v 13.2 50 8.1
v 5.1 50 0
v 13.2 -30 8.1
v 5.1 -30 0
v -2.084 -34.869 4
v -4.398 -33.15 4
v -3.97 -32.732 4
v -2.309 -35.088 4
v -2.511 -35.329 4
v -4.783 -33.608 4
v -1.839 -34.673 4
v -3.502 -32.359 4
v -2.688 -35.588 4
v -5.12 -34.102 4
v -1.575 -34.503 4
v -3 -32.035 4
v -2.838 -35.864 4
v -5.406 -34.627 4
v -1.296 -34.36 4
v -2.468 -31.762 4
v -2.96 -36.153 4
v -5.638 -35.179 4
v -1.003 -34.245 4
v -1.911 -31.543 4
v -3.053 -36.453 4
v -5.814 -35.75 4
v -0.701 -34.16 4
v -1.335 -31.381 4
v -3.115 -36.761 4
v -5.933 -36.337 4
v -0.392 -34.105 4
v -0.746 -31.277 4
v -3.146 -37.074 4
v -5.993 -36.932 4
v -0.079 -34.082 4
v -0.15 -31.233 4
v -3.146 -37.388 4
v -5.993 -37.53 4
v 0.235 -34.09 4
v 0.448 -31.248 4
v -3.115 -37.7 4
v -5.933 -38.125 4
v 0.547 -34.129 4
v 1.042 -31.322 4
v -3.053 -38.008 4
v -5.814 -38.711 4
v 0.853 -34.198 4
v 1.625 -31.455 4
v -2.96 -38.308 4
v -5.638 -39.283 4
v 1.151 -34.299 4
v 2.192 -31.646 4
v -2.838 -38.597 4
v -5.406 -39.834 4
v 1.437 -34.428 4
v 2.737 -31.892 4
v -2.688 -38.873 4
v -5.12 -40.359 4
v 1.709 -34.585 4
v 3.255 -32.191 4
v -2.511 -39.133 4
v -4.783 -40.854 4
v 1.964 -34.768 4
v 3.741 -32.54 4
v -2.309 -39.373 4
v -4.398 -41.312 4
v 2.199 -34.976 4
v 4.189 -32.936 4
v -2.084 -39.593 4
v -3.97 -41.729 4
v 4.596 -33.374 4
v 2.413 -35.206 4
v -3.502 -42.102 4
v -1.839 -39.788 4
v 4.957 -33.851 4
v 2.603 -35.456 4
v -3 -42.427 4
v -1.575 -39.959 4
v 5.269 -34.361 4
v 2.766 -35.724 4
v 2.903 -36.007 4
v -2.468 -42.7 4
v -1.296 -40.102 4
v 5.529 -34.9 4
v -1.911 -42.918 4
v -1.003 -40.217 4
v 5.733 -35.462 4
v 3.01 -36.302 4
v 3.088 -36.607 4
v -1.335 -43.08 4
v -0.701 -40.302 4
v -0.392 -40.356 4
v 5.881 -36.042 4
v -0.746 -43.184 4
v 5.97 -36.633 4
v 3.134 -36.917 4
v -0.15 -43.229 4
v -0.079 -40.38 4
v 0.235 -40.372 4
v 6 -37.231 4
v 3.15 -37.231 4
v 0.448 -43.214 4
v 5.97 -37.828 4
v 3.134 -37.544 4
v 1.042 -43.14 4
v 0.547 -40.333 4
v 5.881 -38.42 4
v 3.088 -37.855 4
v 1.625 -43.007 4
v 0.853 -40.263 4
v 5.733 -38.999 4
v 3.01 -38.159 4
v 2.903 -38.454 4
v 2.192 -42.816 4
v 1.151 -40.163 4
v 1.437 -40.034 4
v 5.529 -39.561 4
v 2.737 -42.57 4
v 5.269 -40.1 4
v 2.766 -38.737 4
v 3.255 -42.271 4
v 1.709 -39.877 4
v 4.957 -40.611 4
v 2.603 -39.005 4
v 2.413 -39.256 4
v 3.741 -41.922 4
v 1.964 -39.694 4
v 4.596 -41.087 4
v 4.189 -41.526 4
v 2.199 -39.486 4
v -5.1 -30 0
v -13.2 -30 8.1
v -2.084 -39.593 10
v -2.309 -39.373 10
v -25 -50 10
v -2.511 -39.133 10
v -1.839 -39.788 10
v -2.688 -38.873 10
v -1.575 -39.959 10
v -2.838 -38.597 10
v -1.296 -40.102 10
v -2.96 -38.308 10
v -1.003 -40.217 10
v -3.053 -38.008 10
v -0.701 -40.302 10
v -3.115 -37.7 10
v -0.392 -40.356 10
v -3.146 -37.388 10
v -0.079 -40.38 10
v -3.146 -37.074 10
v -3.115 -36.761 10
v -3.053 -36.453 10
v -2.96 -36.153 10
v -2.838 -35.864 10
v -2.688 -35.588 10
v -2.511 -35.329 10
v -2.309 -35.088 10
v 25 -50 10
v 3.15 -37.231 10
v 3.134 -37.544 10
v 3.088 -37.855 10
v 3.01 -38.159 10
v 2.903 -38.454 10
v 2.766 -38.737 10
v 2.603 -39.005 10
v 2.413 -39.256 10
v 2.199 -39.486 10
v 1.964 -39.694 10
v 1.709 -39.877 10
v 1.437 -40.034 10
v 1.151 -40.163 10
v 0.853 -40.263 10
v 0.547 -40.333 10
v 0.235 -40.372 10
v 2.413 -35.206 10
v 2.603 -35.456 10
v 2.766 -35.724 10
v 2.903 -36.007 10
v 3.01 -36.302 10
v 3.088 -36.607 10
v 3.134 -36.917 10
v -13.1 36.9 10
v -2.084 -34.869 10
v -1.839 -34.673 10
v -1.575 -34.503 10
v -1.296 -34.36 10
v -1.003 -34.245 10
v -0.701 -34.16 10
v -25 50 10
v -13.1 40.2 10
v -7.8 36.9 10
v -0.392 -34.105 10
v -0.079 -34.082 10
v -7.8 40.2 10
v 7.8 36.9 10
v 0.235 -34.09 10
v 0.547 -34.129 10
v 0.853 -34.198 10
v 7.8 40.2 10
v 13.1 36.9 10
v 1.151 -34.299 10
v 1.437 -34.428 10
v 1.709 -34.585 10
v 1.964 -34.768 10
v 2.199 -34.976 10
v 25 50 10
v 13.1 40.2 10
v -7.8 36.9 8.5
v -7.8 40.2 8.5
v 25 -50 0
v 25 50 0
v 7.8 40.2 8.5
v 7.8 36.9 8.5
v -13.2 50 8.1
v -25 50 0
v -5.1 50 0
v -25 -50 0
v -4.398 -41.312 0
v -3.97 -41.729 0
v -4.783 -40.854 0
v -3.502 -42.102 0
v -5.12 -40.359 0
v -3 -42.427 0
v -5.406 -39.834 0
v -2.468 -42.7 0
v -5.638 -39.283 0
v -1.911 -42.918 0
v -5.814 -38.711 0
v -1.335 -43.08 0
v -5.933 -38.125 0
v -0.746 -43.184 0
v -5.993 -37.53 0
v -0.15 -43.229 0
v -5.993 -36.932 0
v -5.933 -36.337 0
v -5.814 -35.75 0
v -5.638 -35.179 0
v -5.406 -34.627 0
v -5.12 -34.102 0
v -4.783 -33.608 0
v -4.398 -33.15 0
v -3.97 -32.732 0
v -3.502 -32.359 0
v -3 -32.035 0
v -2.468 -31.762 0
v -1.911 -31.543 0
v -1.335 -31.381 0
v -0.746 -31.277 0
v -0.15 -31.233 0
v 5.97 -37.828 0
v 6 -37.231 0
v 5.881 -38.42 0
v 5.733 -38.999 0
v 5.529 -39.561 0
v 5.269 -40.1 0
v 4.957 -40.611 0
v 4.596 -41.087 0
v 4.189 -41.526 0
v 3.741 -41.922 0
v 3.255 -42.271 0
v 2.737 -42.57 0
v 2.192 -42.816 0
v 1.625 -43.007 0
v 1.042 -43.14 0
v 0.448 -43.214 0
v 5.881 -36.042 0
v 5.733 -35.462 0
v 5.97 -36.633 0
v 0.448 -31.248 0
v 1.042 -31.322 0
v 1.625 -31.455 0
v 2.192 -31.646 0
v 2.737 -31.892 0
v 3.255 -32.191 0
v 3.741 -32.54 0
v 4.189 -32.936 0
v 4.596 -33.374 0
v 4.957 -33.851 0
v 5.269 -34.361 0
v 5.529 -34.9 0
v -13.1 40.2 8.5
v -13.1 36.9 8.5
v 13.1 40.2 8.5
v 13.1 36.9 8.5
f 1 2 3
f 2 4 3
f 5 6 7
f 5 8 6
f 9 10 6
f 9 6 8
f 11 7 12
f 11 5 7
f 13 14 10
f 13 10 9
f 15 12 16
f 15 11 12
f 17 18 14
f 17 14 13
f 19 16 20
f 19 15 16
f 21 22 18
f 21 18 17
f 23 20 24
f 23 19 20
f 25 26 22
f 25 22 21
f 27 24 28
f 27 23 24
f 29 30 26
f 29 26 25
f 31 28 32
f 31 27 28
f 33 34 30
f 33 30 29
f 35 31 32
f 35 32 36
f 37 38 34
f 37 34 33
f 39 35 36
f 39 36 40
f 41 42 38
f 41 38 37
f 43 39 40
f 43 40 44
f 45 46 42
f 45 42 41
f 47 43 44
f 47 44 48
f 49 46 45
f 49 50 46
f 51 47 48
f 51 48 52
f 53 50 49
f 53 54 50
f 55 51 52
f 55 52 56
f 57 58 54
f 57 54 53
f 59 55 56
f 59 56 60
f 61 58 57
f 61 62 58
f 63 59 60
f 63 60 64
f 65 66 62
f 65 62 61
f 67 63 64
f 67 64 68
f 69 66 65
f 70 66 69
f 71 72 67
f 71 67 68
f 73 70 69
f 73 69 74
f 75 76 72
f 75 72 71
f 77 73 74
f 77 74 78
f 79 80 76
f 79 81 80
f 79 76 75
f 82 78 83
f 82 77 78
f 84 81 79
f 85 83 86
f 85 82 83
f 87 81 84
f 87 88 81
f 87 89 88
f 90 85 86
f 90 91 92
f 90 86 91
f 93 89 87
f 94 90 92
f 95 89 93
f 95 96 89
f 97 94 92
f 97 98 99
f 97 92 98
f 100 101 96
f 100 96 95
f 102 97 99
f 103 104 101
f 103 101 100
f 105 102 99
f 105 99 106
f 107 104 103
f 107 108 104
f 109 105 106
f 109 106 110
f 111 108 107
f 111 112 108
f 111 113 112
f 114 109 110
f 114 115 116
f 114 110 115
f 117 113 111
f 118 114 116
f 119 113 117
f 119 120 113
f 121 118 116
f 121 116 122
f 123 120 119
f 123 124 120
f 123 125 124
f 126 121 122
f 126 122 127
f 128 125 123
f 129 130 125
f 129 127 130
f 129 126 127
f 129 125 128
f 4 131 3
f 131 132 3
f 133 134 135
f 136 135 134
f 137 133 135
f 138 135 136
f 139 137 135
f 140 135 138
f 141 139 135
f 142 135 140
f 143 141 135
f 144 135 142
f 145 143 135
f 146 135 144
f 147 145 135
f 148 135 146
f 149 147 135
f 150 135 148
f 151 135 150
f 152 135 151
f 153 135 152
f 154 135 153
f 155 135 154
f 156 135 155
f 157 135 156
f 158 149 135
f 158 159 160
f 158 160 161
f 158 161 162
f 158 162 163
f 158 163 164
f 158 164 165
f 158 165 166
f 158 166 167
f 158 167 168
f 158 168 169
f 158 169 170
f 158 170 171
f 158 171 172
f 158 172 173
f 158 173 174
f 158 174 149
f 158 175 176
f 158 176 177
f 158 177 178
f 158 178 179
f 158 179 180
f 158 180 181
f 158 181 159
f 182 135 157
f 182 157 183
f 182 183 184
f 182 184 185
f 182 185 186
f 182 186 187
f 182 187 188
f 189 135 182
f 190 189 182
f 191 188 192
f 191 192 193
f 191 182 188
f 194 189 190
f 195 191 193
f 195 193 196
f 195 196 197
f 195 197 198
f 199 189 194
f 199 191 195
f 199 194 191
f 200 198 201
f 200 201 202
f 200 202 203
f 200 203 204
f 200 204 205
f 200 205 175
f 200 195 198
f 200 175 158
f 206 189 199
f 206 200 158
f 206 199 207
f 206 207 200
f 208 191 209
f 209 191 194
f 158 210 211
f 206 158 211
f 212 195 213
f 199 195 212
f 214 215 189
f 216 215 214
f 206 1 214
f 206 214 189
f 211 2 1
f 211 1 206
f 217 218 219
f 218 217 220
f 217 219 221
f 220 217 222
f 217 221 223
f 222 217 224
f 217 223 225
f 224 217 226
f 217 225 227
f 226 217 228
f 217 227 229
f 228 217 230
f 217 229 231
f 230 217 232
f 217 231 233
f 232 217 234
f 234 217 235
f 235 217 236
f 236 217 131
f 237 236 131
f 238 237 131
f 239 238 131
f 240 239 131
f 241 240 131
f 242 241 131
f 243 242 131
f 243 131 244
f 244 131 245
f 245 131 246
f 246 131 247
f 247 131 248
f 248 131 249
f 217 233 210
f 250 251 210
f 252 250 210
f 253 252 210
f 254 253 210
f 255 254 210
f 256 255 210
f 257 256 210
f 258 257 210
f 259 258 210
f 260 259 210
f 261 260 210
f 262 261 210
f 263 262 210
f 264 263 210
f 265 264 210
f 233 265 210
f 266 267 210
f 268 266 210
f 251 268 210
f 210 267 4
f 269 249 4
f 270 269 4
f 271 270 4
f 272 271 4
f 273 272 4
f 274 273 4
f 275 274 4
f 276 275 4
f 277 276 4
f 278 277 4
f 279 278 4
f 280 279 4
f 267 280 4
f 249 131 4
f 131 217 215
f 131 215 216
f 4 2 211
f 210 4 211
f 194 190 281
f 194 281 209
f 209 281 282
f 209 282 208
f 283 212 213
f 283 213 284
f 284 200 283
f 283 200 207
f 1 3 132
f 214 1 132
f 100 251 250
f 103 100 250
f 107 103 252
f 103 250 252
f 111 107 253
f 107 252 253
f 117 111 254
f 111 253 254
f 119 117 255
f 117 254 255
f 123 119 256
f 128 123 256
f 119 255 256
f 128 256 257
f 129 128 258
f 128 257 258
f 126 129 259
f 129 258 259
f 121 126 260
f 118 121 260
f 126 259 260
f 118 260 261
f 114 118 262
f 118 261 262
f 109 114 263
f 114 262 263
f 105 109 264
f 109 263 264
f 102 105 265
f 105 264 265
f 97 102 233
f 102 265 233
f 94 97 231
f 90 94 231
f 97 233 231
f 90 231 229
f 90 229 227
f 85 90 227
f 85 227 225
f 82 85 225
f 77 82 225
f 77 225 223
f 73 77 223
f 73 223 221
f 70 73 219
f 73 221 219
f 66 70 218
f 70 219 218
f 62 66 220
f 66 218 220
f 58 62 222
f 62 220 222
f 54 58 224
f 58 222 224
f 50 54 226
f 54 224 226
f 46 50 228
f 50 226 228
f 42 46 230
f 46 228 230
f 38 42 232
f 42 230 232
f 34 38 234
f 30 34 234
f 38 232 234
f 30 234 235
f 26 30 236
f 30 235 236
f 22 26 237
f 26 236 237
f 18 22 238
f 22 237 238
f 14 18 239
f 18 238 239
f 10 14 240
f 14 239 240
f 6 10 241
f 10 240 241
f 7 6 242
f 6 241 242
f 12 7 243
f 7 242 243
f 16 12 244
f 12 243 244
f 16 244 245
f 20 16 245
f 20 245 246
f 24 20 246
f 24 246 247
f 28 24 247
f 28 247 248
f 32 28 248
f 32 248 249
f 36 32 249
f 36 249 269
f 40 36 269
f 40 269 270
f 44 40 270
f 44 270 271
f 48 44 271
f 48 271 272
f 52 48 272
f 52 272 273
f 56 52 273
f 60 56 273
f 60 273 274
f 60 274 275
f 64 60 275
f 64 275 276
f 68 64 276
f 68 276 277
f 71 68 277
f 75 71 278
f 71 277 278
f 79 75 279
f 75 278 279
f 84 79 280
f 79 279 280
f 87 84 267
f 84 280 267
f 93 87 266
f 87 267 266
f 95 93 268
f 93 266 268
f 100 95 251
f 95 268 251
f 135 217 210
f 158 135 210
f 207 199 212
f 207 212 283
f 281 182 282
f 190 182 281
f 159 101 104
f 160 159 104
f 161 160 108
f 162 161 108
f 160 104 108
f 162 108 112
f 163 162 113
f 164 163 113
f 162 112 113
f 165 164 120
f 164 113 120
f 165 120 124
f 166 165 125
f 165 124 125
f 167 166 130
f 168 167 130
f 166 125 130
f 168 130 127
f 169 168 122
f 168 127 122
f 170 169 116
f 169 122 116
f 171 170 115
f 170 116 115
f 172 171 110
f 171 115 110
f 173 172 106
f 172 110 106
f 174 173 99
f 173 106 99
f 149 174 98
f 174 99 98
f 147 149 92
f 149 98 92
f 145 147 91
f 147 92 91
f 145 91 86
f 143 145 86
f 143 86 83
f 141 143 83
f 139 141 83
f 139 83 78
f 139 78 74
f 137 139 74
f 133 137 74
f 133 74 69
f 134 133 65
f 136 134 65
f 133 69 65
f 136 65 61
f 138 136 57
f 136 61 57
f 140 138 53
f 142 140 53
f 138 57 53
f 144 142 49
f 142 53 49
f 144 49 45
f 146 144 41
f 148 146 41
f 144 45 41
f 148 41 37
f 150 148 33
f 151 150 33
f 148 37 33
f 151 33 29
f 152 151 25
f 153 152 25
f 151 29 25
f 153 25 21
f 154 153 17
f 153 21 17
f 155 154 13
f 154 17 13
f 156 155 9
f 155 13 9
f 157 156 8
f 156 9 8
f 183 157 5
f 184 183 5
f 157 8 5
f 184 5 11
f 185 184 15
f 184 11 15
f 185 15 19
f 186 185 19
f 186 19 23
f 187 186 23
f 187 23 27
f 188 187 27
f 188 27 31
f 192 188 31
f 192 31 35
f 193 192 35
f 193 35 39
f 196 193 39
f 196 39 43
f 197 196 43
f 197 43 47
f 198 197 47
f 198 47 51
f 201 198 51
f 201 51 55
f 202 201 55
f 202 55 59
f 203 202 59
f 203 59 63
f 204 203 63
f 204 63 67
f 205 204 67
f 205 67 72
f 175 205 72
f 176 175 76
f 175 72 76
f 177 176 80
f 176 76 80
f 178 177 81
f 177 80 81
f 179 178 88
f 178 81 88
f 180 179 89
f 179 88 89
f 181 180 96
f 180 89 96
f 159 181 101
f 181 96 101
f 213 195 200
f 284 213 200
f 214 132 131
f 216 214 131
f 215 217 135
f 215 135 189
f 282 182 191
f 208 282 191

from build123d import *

# Parameters (mm, degrees)
F0_W          = 50
F0_H          = 100
F1_DEPTH      = 10
F3_DEPTH      = 50
F3_DEPTH_BACK = 30
F4_W          = 5.3
F4_H          = 3.3
F5_DEPTH      = 1.5
F6_R          = 6
F7_DEPTH      = 4
F8_R          = 3.15
F9_DEPTH      = 6


with BuildPart() as f1:
    # F0 (on Top) → F1 (new body)
    with BuildSketch(Plane.XY):
        Rectangle(F0_W, F0_H)
    extrude(amount=F1_DEPTH)

    # F2 (on Front) → F3 (cut, two sides)
    with BuildSketch(Plane.XZ) as f3_sk:
        Polygon((-5.1, 0), (0, 0), (5.1, 0), (13.2, 8.1), (0, 8.1), (-13.2, 8.1), align=None)
    extrude(amount=-F3_DEPTH, mode=Mode.SUBTRACT)
    extrude(f3_sk.sketch, amount=F3_DEPTH_BACK, mode=Mode.SUBTRACT)

    # F4 (on face) → F5 (cut)
    with BuildSketch(Plane.XY.offset(10)):
        with Locations((-10.45, 38.55)):
            Rectangle(F4_W, F4_H)
        with Locations((10.45, 38.55)):
            Rectangle(F4_W, F4_H)
    extrude(amount=-F5_DEPTH, mode=Mode.SUBTRACT)

    # F6 (on face) → F7 (cut)
    with BuildSketch(Plane(origin=(0, 0, 0), x_dir=(1, 0, 0), z_dir=(0, 0, -1))):
        with Locations((0, 37.2307598591)):
            Circle(F6_R)
    extrude(amount=-F7_DEPTH, mode=Mode.SUBTRACT)

    # F8 (on face) → F9 (cut, through all)
    with BuildSketch(Plane(origin=(0, 0, 4), x_dir=(1, 0, 0), z_dir=(0, 0, -1))):
        with Locations((0, 37.2307598591)):
            Circle(F8_R)
    extrude(amount=-F9_DEPTH, mode=Mode.SUBTRACT)


solid = f1.part
